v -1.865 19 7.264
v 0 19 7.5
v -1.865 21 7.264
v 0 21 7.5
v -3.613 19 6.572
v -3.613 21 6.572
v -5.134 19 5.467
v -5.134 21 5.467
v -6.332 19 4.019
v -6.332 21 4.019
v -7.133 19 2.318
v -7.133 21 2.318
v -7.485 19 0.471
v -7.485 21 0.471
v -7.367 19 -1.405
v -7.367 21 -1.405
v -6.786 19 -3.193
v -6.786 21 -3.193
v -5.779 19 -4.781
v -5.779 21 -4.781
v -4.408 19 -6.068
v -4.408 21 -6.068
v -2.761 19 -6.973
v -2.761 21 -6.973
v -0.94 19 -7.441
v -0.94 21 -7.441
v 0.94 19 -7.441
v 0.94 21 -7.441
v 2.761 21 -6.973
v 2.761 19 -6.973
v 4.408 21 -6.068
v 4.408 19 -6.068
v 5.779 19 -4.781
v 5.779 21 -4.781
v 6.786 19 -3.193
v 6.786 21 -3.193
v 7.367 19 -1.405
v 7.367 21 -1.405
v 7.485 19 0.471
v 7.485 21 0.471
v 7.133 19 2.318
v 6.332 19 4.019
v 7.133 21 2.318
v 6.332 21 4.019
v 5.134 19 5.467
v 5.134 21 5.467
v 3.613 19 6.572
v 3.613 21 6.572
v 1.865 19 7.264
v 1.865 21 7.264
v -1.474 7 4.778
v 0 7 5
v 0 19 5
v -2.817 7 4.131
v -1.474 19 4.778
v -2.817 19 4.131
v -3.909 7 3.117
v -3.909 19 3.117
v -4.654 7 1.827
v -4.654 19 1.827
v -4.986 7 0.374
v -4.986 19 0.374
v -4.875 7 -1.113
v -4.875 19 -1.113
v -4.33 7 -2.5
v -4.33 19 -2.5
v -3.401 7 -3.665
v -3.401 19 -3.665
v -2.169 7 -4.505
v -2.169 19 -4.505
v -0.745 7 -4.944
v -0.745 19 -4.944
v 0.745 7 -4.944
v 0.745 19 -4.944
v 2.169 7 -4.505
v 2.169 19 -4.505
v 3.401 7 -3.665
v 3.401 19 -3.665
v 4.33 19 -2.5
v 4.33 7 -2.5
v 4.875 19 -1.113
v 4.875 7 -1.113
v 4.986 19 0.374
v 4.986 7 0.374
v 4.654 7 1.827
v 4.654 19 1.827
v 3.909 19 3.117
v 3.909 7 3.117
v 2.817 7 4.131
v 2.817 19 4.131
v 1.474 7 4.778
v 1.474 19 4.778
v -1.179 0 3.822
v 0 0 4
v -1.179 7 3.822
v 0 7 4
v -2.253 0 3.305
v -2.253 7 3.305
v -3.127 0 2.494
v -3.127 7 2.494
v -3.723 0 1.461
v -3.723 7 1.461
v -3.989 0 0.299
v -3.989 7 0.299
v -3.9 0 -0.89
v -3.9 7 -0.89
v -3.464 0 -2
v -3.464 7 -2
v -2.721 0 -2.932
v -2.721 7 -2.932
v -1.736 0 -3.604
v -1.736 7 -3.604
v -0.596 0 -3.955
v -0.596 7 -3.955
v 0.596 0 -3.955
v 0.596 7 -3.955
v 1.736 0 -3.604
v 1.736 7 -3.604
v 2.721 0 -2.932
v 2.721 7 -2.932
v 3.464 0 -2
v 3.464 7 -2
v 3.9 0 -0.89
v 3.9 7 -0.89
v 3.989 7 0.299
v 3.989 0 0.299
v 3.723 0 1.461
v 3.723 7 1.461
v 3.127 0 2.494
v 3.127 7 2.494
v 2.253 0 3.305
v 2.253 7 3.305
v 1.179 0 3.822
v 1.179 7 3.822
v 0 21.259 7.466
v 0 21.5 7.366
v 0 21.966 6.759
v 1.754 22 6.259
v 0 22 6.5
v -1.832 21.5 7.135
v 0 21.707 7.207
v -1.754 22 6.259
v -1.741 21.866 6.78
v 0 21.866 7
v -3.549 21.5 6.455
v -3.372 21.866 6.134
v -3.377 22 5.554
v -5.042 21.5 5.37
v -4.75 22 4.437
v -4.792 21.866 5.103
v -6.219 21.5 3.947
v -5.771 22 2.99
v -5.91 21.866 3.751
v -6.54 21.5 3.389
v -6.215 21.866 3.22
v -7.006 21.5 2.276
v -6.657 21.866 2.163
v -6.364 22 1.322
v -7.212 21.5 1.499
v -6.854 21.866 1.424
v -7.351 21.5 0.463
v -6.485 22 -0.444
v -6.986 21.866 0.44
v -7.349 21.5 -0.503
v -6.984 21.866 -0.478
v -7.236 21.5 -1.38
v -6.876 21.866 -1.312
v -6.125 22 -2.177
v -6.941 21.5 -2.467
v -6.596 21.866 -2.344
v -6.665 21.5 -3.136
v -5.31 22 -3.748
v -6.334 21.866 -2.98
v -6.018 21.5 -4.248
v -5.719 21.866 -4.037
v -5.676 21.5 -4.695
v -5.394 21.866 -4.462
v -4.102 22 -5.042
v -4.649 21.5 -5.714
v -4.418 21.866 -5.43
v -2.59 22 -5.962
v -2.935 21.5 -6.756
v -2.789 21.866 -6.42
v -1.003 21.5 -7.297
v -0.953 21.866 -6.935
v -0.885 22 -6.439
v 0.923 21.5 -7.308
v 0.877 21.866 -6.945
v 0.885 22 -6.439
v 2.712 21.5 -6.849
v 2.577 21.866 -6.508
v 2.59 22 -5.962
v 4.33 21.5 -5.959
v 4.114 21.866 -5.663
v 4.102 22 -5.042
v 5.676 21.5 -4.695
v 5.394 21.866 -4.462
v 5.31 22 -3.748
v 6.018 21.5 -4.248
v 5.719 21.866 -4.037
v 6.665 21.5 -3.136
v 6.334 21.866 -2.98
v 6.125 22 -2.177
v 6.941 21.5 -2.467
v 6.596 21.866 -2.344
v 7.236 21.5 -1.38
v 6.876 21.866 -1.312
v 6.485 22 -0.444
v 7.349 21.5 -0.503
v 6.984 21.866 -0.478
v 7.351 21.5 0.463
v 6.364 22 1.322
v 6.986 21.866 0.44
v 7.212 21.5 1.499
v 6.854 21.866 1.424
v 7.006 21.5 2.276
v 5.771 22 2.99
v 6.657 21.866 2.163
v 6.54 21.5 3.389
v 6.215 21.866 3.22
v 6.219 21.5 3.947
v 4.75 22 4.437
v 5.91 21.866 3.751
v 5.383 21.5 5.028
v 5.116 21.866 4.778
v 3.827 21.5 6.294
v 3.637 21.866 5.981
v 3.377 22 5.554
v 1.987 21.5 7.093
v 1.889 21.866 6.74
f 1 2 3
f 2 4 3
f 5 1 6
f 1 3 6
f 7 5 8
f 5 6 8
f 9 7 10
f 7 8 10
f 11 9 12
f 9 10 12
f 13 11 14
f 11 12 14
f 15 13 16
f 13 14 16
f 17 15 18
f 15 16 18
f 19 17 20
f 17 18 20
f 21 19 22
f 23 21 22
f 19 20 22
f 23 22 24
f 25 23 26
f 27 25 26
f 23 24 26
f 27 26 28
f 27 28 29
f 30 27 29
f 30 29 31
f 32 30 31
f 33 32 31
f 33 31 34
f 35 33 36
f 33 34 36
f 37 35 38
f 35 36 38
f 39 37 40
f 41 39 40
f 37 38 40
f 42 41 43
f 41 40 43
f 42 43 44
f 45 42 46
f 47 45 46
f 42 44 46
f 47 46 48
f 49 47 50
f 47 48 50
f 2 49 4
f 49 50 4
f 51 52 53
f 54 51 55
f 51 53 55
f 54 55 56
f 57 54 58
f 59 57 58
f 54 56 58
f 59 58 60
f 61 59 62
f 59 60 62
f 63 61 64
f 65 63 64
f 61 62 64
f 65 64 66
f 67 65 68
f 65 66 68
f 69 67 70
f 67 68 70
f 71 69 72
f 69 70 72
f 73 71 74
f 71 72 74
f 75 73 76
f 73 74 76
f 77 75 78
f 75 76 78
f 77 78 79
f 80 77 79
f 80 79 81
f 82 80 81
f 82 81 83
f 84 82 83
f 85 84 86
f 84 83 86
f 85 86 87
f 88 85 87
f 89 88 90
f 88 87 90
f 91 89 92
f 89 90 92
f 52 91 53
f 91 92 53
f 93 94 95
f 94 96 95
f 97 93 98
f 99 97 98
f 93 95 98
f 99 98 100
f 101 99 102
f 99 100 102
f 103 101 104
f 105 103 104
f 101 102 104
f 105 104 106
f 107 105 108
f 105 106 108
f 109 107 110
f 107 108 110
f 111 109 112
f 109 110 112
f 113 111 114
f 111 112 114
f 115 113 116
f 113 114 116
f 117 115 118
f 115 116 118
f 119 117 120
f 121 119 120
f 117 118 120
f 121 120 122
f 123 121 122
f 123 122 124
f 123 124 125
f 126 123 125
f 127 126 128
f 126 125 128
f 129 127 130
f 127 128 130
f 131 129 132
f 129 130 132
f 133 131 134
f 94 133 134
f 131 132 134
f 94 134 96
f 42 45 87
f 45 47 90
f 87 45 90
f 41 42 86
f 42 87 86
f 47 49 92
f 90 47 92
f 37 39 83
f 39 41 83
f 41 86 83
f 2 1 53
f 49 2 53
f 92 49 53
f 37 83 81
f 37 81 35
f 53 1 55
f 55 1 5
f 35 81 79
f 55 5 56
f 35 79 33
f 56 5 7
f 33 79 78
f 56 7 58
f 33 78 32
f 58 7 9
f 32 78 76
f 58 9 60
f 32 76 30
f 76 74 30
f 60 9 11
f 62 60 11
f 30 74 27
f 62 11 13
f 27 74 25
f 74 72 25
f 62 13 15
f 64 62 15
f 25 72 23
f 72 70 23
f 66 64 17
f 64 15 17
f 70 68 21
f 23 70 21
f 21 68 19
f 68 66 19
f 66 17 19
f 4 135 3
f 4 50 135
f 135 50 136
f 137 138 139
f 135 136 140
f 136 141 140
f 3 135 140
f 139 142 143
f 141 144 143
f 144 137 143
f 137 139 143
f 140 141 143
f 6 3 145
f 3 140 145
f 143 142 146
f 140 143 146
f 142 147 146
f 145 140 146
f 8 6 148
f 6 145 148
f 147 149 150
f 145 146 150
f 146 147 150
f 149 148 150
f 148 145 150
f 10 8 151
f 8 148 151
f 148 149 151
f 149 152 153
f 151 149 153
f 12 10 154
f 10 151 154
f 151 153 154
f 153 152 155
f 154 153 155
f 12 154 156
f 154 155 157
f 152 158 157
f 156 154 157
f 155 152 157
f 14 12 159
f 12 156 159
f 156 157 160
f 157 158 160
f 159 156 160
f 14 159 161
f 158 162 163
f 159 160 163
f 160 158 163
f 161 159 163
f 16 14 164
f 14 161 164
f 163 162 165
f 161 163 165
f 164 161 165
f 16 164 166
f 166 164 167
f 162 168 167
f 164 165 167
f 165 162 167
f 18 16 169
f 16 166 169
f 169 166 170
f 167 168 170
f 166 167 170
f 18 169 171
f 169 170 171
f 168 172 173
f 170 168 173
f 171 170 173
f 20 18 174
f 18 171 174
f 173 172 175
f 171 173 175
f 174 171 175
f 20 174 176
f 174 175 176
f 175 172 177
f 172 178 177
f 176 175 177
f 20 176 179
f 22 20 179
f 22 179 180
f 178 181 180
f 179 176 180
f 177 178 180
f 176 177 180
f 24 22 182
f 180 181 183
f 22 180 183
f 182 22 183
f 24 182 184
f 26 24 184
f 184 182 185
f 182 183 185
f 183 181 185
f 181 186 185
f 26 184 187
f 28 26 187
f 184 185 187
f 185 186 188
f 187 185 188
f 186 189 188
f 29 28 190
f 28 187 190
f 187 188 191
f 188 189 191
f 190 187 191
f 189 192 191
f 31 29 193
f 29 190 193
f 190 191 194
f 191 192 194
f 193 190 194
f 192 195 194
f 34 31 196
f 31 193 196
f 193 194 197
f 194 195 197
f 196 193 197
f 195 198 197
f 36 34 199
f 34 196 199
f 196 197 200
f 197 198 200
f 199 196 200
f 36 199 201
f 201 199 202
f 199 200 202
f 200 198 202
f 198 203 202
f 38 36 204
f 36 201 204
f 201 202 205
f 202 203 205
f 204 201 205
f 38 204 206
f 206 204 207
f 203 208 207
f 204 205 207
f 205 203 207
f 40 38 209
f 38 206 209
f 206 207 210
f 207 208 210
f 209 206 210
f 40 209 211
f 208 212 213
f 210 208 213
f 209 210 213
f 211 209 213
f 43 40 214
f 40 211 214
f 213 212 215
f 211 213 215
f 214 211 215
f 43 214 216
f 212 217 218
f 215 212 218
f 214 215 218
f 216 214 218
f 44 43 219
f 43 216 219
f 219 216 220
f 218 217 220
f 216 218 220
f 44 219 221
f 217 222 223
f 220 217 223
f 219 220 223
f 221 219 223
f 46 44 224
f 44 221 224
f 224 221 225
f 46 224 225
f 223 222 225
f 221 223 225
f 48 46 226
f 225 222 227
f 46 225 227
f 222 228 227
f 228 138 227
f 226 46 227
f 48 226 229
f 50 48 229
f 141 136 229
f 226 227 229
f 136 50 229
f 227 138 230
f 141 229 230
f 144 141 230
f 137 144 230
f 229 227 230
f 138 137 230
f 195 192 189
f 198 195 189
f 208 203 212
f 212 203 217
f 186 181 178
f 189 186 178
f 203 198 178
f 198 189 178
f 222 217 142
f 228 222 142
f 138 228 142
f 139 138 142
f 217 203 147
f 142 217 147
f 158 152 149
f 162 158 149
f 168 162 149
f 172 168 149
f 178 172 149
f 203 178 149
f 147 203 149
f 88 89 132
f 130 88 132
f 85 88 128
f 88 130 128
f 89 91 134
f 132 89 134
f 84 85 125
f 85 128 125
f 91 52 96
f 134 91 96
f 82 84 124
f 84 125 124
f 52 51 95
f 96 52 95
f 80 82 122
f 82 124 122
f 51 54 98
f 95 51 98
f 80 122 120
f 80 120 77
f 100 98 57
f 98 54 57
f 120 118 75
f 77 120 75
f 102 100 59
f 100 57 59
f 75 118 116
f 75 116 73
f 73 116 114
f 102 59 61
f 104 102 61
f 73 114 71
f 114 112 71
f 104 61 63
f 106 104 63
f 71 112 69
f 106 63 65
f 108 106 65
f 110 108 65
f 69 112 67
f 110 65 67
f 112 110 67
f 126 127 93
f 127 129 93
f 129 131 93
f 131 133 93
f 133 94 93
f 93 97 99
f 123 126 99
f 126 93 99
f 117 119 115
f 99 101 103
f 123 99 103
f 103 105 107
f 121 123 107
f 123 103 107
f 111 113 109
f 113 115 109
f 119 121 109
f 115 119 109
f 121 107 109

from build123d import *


with BuildPart() as part:
    # Sketch1 → Revolve1 (revolve)
    with BuildSketch(Plane.XY, mode=Mode.PRIVATE) as revolve1_sk:
        with BuildLine():
            Line((0, 0), (-4, 0))
            Line((-4, 0), (-4, 7))
            Line((-4, 7), (-5, 7))
            Line((-5, 7), (-5, 19))
            Line((-5, 19), (-7.5, 19))
            Line((-7.5, 19), (-7.5, 21))
            ThreePointArc((-7.5, 21), (-7.207106781, 21.707106781), (-6.5, 22))
            Line((-6.5, 22), (0, 22))
            Line((0, 22), (0, 0))
        make_face()
    revolve(revolve1_sk.sketch.rotate(Axis((0, 22, 0), (0, -1, 0)), 270), axis=Axis((0, 22, 0), (0, -1, 0)))


solid = part.part
